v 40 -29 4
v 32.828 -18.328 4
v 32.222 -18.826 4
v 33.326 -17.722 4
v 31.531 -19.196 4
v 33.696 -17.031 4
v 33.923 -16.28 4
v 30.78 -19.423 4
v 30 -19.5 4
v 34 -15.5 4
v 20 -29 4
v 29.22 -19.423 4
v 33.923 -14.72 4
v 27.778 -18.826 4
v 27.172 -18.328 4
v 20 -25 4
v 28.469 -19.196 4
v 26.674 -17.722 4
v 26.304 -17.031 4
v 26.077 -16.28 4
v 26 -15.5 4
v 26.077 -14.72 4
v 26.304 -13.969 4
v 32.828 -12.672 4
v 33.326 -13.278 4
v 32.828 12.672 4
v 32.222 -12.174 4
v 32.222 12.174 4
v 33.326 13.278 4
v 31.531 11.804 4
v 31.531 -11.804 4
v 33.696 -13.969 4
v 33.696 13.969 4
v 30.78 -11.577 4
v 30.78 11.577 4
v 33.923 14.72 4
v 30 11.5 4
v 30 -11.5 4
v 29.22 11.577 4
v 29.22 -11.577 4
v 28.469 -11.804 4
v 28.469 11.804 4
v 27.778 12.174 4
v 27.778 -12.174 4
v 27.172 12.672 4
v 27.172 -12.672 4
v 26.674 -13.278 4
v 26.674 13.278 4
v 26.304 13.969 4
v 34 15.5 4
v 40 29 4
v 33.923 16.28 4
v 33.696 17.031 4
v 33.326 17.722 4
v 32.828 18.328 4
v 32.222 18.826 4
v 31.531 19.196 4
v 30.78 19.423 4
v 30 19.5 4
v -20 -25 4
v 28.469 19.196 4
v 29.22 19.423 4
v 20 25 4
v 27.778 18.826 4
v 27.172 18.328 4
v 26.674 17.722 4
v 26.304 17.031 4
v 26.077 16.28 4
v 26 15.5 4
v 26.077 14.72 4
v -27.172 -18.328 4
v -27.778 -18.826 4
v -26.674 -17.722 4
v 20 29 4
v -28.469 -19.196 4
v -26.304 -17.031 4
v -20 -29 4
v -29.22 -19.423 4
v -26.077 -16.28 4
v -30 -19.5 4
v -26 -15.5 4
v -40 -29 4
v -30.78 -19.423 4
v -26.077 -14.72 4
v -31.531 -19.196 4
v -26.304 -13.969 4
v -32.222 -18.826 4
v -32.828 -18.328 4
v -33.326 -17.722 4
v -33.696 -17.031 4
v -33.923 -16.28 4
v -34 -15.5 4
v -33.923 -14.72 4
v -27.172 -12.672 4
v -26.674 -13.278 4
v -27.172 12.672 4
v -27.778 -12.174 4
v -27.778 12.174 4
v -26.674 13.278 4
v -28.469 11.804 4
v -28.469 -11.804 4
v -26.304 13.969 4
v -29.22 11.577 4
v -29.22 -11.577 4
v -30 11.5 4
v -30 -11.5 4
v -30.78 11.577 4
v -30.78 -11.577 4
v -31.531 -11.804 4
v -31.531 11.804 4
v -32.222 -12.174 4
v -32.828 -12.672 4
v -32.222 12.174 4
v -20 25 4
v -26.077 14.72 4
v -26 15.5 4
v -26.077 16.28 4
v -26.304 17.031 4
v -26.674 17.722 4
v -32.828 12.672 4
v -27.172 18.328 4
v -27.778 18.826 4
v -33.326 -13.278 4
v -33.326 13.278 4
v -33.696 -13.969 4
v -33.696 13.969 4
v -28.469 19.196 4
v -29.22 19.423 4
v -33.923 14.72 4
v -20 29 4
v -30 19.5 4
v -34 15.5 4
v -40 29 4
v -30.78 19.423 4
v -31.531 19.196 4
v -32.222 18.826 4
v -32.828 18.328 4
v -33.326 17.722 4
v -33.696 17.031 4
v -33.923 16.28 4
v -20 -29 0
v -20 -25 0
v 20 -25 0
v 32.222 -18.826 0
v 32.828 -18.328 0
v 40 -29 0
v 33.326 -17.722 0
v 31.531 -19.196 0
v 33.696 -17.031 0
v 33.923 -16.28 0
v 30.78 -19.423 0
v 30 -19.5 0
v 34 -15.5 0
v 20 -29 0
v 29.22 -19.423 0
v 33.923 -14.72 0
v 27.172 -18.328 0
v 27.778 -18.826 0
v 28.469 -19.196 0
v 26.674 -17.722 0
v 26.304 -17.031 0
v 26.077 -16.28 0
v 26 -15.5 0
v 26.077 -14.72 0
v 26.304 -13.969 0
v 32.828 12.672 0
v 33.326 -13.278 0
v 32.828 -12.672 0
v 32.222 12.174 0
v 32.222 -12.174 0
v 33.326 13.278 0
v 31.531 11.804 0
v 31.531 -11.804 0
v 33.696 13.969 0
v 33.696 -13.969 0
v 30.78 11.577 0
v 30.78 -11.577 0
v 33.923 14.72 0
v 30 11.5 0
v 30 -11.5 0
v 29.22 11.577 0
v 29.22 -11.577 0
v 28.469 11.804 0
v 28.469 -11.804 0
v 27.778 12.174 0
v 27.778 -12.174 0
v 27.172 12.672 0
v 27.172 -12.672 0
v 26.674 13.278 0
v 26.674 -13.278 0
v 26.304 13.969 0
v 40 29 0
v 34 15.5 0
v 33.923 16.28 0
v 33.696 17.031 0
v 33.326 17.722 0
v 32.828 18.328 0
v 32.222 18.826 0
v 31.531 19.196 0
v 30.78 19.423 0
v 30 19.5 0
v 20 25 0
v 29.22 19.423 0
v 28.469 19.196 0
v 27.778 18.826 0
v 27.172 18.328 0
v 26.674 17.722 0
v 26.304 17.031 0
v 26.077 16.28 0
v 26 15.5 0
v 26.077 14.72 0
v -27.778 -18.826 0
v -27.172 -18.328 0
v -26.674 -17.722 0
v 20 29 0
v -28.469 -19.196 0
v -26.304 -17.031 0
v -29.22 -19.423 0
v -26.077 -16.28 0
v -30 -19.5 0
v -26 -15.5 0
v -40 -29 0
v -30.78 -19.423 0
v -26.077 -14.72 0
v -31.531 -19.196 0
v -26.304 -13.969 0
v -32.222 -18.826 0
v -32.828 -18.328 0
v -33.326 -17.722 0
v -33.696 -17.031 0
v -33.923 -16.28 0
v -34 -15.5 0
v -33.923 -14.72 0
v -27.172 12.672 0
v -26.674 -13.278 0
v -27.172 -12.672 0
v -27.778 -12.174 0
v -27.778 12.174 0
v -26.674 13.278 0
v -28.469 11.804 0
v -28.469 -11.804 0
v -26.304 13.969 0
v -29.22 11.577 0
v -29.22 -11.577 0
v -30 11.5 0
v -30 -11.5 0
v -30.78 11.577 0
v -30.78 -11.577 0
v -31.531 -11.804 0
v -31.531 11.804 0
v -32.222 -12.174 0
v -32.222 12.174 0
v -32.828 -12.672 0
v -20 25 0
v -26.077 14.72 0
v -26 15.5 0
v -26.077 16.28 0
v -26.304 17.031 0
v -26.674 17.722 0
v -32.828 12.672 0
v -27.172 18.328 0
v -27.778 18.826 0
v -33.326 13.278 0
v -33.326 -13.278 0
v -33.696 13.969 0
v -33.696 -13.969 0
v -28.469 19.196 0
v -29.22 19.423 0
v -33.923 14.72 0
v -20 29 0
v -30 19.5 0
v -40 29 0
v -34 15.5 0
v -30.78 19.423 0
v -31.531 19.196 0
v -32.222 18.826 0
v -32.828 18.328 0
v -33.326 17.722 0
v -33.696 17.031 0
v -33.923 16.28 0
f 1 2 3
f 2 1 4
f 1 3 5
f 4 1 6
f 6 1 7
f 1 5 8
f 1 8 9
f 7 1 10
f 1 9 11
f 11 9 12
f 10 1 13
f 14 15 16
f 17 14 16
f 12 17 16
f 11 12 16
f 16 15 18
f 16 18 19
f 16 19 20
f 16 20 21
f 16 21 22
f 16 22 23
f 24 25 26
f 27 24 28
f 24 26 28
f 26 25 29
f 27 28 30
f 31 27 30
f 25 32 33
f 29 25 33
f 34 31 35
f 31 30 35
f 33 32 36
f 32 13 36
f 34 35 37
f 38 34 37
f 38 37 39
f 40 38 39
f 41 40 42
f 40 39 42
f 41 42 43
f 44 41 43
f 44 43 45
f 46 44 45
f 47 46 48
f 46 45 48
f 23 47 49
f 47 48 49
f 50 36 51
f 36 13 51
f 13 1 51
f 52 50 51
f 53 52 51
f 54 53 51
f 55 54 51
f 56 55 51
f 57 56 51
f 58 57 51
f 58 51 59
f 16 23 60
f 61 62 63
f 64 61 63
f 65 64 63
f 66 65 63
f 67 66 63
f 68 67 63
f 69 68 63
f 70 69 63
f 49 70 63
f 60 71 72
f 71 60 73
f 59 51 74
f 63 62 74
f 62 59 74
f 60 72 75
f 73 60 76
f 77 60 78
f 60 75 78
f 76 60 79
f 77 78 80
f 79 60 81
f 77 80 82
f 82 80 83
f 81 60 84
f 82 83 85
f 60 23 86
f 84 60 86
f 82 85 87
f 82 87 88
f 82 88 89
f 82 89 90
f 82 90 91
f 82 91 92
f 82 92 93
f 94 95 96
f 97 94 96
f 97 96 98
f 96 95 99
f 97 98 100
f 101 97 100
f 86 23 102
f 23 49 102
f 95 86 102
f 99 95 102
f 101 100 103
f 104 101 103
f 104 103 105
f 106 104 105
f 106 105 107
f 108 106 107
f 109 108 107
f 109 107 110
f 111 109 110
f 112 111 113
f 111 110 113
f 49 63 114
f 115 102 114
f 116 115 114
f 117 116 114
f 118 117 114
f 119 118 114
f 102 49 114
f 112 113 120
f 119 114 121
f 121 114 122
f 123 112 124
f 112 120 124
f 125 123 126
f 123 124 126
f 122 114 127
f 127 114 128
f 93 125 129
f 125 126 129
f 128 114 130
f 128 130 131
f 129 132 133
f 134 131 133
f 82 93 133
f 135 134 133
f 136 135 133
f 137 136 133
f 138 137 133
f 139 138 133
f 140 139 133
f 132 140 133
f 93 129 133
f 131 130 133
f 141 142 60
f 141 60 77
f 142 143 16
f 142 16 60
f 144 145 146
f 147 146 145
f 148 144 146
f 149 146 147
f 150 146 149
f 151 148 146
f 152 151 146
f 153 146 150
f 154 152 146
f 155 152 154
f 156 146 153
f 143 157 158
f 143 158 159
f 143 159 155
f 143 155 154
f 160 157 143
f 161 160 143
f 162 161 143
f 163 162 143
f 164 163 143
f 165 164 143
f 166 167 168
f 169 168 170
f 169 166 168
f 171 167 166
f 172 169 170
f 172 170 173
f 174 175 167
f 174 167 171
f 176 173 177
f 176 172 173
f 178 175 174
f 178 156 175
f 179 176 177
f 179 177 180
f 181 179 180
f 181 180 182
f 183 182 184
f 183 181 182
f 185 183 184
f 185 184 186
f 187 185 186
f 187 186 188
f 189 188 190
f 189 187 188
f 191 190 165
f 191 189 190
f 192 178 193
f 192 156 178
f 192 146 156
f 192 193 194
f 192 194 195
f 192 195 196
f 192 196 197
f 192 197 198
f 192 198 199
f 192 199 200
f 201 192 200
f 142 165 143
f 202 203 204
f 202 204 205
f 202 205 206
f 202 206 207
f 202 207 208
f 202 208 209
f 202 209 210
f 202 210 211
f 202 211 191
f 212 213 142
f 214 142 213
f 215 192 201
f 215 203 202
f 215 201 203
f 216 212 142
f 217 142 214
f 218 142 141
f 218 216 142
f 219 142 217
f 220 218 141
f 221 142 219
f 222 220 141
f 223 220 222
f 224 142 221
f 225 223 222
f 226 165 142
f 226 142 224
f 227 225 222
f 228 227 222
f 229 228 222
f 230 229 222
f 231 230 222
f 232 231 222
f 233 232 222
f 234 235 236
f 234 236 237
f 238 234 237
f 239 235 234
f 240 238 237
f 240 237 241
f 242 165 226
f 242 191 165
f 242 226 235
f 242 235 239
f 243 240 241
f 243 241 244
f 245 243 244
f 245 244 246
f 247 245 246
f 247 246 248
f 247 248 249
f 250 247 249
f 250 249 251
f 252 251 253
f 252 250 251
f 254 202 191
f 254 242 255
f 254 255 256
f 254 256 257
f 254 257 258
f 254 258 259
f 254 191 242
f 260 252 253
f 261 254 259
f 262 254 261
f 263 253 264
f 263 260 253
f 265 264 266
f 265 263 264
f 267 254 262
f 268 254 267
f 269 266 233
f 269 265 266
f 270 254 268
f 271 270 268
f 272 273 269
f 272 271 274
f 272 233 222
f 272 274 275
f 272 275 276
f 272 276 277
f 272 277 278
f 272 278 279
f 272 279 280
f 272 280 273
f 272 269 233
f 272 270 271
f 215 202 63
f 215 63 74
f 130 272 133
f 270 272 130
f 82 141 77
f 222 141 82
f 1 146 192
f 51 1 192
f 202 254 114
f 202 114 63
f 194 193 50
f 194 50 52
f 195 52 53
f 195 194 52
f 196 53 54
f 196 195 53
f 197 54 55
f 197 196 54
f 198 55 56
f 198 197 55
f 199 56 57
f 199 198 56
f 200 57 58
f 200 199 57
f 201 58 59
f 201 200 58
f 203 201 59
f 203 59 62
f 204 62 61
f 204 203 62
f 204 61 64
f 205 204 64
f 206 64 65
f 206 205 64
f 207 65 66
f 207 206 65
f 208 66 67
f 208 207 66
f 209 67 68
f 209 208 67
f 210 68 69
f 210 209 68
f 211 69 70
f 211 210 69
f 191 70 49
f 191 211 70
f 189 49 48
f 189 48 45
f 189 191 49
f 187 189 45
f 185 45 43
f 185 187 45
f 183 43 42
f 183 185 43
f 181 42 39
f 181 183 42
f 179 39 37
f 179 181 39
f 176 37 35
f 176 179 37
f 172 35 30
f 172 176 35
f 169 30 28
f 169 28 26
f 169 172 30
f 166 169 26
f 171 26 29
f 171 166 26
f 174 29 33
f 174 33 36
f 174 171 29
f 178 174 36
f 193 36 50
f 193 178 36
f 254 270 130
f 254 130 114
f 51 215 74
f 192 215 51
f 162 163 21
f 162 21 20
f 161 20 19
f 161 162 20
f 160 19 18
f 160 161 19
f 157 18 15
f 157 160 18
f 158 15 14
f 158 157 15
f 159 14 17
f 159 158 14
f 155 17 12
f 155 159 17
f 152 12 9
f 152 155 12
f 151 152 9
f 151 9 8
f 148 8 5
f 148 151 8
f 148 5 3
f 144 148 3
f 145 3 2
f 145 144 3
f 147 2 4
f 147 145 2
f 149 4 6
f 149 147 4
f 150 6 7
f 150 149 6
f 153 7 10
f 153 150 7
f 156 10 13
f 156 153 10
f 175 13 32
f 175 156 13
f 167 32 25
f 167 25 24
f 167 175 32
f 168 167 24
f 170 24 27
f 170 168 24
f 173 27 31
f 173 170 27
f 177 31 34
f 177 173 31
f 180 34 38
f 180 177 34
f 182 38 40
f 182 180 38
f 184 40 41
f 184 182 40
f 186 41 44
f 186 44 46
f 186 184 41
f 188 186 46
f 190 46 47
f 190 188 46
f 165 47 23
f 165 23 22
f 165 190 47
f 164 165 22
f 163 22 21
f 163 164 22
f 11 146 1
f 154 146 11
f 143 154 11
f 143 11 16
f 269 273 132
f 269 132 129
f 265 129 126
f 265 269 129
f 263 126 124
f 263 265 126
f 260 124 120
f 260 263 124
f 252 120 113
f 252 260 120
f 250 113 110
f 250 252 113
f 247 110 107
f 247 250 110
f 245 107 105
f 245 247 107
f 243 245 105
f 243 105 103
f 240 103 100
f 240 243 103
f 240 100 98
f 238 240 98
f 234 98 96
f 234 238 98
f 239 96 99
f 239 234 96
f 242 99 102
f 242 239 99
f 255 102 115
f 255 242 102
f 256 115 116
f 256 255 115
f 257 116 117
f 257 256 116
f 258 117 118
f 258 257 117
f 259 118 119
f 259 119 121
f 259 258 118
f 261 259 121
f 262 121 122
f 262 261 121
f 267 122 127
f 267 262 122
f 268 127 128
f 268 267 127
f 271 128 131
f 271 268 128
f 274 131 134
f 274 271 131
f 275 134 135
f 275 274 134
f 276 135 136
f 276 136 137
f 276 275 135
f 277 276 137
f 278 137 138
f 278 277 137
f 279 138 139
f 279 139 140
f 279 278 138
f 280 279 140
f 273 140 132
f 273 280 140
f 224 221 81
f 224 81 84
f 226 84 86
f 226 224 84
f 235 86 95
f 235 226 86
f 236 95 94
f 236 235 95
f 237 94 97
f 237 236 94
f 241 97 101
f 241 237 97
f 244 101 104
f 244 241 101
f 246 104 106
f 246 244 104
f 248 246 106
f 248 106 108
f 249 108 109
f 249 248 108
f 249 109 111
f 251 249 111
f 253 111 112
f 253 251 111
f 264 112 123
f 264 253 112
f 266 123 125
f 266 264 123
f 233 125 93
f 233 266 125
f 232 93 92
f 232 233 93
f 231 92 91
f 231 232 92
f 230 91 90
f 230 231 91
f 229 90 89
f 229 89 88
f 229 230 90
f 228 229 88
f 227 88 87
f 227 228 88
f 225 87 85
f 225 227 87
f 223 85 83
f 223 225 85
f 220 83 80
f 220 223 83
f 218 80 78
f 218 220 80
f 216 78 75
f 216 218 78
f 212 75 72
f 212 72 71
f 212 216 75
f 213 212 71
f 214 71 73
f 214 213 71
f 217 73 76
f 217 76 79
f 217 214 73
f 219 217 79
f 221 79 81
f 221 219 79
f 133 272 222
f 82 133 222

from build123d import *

# Parameters (mm, degrees)
SKETCH1_R           = 4
BOSS_EXTRUDE1_DEPTH = 4


with BuildPart() as part:
    # Sketch1 → Boss-Extrude1 (new body)
    with BuildSketch(Plane.XY):
        Polygon((-20, 25), (20, 25), (20, 29), (40, 29), (40, 25), (40, -25), (40, -29), (20, -29), (20, -25), (-20, -25), (-20, -29), (-40, -29), (-40, -25), (-40, 25), (-40, 29), (-20, 29), align=None)
        with Locations((30, 15.5)):
            Circle(SKETCH1_R, mode=Mode.SUBTRACT)
        with Locations(Location((-30, 15.5, 0), (0, 0, 180))):
            Circle(SKETCH1_R, mode=Mode.SUBTRACT)
        with Locations((-30, -15.5)):
            Circle(SKETCH1_R, mode=Mode.SUBTRACT)
        with Locations(Location((30, -15.5, 0), (0, 0, 180))):
            Circle(SKETCH1_R, mode=Mode.SUBTRACT)
    extrude(amount=BOSS_EXTRUDE1_DEPTH)


solid = part.part
